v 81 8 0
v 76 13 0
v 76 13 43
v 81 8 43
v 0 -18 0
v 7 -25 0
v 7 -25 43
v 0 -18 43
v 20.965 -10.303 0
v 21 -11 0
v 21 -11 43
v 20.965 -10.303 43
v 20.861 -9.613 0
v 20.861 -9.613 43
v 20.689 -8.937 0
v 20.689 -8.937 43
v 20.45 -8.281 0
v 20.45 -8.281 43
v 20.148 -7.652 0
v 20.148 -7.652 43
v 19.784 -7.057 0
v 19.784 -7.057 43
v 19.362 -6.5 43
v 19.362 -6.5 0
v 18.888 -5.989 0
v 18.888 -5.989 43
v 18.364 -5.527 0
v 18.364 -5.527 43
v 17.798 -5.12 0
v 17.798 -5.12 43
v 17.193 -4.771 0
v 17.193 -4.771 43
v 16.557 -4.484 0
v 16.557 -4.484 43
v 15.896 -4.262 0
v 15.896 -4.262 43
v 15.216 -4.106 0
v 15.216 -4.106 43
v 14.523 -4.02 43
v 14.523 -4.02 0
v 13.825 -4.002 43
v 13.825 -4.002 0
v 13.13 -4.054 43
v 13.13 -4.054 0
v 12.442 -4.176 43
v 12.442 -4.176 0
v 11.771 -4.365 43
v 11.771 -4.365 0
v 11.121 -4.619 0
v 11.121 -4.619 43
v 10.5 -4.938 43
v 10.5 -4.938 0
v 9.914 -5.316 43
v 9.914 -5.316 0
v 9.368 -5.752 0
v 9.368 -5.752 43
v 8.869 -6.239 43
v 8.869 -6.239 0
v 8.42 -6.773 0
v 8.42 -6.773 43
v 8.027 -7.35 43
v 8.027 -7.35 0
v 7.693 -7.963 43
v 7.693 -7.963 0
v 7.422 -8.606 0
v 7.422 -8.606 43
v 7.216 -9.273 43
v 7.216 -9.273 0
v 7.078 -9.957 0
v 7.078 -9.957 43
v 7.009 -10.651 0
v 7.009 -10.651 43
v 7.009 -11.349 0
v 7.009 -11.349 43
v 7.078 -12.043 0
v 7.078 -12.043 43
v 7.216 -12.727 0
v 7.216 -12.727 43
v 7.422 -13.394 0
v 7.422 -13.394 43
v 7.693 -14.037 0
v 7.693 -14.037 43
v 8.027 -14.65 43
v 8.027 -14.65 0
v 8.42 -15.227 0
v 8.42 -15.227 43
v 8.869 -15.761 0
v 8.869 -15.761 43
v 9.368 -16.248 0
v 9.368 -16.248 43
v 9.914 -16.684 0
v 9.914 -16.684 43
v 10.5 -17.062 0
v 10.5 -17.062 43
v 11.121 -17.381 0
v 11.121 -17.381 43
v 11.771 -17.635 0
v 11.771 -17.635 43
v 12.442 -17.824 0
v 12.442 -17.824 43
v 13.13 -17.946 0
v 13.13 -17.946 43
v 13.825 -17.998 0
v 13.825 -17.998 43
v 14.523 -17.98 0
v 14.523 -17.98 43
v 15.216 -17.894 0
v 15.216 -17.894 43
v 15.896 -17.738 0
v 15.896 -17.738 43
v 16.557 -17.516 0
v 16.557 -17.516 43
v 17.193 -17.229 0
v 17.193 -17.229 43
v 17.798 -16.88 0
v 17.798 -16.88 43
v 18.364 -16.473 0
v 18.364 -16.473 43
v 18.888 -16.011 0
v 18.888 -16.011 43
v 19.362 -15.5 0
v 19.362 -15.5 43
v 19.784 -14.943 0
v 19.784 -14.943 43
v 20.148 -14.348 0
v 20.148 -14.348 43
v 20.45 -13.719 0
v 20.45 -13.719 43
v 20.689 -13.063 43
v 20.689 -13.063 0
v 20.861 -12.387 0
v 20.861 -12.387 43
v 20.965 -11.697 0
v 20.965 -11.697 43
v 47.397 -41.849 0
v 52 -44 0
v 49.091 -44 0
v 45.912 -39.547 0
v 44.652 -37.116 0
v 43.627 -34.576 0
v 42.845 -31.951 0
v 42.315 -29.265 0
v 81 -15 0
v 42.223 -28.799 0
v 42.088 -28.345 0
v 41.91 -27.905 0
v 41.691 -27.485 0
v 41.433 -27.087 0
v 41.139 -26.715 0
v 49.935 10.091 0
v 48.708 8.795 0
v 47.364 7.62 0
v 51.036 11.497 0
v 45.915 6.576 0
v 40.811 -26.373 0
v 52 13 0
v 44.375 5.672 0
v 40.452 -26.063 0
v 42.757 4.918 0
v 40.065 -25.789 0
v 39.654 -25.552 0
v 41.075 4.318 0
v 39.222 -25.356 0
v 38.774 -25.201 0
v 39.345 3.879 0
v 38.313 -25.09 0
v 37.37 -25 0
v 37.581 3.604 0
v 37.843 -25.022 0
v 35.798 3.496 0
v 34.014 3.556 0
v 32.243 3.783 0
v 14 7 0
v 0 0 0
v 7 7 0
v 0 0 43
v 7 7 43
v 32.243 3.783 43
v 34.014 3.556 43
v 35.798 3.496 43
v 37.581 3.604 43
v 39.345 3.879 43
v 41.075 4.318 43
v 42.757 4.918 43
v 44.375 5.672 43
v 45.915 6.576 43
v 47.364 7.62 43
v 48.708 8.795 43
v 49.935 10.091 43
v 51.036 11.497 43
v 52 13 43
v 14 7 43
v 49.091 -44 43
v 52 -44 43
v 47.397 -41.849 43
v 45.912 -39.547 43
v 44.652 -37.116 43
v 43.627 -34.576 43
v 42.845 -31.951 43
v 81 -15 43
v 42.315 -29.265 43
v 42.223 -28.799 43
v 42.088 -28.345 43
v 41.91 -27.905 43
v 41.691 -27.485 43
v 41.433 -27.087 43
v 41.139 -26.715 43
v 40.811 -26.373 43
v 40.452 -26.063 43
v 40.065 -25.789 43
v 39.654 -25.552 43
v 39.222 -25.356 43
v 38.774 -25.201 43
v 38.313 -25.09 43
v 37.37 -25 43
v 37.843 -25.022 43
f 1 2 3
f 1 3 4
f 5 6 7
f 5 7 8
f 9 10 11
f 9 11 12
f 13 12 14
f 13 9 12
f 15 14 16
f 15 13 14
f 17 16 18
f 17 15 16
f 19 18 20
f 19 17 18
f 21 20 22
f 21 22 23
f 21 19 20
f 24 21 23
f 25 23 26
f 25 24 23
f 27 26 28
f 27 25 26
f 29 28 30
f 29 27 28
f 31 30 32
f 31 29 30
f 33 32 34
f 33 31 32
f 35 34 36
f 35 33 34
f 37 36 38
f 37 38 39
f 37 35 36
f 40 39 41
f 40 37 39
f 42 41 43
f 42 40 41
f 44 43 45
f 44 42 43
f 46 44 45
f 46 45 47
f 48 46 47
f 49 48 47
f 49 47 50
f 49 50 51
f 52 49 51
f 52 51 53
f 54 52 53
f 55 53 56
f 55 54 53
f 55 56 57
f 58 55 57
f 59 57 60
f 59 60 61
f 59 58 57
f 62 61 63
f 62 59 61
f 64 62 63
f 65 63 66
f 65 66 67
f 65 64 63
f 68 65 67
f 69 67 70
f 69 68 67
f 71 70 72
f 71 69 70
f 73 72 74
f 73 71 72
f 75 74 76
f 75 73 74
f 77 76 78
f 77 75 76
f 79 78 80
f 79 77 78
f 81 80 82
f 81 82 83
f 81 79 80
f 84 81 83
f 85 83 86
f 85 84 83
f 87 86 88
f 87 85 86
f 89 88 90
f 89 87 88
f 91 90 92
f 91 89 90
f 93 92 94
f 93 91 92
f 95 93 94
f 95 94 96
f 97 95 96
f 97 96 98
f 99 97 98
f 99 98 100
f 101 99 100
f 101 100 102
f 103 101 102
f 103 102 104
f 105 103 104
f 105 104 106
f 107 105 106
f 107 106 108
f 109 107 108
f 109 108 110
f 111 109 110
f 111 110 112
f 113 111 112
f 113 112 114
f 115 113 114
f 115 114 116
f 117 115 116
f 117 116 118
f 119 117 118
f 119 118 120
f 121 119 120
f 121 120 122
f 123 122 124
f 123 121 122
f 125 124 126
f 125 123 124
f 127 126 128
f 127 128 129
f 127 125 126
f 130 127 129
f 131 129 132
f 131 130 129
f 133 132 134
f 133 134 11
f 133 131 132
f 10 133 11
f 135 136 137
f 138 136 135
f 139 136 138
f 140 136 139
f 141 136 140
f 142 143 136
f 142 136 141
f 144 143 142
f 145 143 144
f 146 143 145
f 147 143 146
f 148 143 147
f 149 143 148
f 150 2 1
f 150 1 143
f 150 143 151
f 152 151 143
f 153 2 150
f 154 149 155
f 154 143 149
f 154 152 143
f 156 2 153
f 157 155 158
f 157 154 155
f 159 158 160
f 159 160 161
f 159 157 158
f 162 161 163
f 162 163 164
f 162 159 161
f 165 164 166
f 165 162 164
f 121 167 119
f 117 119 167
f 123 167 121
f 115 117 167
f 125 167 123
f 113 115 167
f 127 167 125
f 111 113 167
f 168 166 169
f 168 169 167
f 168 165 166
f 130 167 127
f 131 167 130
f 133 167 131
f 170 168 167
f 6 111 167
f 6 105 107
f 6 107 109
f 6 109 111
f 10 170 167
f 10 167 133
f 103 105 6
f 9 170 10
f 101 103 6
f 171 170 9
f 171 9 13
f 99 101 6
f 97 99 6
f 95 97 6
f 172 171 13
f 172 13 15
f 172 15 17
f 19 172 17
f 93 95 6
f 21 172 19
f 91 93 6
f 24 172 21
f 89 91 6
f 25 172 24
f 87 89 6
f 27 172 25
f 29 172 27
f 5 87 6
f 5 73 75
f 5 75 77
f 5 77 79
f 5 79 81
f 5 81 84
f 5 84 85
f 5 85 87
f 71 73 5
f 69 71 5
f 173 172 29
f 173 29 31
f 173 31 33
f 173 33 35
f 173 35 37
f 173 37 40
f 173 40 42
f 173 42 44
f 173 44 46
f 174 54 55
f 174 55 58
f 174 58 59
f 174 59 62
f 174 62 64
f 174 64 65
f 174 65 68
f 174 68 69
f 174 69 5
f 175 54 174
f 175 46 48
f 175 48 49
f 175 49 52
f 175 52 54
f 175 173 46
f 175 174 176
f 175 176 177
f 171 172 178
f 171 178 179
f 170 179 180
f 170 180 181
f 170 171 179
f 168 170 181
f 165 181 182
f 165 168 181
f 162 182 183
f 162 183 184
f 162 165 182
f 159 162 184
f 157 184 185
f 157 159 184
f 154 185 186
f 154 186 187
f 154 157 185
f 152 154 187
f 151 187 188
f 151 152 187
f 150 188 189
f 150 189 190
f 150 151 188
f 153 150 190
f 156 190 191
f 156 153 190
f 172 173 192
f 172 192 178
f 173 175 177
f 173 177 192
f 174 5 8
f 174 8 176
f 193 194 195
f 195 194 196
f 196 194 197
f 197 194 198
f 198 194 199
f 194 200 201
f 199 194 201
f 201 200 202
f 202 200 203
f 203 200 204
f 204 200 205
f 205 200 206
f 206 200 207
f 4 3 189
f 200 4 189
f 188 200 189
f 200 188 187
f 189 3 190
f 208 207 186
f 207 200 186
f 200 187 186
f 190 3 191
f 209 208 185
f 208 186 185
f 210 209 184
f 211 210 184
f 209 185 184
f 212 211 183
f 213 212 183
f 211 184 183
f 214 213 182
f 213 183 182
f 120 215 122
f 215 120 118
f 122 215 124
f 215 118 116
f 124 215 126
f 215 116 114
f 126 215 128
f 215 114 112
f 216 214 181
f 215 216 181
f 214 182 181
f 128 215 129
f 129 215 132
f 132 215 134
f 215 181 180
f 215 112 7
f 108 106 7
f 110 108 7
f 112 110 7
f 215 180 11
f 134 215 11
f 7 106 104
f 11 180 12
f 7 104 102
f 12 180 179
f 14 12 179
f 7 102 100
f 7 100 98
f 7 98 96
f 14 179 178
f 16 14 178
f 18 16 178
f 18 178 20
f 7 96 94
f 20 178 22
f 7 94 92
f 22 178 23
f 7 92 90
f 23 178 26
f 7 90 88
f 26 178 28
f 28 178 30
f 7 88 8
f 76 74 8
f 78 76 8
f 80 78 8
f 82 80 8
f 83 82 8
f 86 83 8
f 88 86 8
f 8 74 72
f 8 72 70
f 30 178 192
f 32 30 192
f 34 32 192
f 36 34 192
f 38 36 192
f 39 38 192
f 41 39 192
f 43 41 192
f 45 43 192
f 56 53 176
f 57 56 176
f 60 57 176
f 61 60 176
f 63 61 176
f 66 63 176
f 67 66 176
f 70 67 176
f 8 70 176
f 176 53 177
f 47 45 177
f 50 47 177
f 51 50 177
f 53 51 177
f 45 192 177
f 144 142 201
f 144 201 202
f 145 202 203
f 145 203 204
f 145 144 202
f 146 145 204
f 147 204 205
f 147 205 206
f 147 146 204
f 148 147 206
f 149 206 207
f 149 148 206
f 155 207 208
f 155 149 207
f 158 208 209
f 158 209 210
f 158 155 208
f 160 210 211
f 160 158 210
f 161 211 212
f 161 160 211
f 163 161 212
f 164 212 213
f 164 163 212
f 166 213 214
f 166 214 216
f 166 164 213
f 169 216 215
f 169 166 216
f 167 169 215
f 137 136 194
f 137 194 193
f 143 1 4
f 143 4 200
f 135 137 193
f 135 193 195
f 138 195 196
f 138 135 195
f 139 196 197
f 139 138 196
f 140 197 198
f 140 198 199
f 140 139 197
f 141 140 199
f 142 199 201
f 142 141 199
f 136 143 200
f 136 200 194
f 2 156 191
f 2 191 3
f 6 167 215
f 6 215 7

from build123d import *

# Parameters (mm, degrees)
SKETCH1_R           = 7
BOSS_EXTRUDE2_DEPTH = 43


with BuildPart() as part:
    # Sketch1 → Boss-Extrude2 (new body)
    with BuildSketch(Plane.XY):
        with BuildLine():
            Line((0, 0), (7, 7))
            Line((7, 7), (14, 7))
            Line((14, 7), (32.243084988, 3.783251905))
            ThreePointArc((32.243084988, 3.783251905), (43.574972961, 5.276069151), (52, 13))
            Line((52, 13), (76, 13))
            Line((76, 13), (81, 8))
            Line((81, 8), (81, -15))
            Line((81, -15), (52, -44))
            Line((52, -44), (49.0910977, -44))
            ThreePointArc((49.0910977, -44), (44.652125503, -37.115672061), (42.3152953, -29.264705882))
            ThreePointArc((42.3152953, -29.264705882), (40.634892339, -26.213413768), (37.369656558, -25))
            Line((37.369656558, -25), (7, -25))
            Line((7, -25), (0, -18))
            Line((0, -18), (0, 0))
        make_face()
        with Locations((14, -11)):
            Circle(SKETCH1_R, mode=Mode.SUBTRACT)
    extrude(amount=BOSS_EXTRUDE2_DEPTH)


solid = part.part
